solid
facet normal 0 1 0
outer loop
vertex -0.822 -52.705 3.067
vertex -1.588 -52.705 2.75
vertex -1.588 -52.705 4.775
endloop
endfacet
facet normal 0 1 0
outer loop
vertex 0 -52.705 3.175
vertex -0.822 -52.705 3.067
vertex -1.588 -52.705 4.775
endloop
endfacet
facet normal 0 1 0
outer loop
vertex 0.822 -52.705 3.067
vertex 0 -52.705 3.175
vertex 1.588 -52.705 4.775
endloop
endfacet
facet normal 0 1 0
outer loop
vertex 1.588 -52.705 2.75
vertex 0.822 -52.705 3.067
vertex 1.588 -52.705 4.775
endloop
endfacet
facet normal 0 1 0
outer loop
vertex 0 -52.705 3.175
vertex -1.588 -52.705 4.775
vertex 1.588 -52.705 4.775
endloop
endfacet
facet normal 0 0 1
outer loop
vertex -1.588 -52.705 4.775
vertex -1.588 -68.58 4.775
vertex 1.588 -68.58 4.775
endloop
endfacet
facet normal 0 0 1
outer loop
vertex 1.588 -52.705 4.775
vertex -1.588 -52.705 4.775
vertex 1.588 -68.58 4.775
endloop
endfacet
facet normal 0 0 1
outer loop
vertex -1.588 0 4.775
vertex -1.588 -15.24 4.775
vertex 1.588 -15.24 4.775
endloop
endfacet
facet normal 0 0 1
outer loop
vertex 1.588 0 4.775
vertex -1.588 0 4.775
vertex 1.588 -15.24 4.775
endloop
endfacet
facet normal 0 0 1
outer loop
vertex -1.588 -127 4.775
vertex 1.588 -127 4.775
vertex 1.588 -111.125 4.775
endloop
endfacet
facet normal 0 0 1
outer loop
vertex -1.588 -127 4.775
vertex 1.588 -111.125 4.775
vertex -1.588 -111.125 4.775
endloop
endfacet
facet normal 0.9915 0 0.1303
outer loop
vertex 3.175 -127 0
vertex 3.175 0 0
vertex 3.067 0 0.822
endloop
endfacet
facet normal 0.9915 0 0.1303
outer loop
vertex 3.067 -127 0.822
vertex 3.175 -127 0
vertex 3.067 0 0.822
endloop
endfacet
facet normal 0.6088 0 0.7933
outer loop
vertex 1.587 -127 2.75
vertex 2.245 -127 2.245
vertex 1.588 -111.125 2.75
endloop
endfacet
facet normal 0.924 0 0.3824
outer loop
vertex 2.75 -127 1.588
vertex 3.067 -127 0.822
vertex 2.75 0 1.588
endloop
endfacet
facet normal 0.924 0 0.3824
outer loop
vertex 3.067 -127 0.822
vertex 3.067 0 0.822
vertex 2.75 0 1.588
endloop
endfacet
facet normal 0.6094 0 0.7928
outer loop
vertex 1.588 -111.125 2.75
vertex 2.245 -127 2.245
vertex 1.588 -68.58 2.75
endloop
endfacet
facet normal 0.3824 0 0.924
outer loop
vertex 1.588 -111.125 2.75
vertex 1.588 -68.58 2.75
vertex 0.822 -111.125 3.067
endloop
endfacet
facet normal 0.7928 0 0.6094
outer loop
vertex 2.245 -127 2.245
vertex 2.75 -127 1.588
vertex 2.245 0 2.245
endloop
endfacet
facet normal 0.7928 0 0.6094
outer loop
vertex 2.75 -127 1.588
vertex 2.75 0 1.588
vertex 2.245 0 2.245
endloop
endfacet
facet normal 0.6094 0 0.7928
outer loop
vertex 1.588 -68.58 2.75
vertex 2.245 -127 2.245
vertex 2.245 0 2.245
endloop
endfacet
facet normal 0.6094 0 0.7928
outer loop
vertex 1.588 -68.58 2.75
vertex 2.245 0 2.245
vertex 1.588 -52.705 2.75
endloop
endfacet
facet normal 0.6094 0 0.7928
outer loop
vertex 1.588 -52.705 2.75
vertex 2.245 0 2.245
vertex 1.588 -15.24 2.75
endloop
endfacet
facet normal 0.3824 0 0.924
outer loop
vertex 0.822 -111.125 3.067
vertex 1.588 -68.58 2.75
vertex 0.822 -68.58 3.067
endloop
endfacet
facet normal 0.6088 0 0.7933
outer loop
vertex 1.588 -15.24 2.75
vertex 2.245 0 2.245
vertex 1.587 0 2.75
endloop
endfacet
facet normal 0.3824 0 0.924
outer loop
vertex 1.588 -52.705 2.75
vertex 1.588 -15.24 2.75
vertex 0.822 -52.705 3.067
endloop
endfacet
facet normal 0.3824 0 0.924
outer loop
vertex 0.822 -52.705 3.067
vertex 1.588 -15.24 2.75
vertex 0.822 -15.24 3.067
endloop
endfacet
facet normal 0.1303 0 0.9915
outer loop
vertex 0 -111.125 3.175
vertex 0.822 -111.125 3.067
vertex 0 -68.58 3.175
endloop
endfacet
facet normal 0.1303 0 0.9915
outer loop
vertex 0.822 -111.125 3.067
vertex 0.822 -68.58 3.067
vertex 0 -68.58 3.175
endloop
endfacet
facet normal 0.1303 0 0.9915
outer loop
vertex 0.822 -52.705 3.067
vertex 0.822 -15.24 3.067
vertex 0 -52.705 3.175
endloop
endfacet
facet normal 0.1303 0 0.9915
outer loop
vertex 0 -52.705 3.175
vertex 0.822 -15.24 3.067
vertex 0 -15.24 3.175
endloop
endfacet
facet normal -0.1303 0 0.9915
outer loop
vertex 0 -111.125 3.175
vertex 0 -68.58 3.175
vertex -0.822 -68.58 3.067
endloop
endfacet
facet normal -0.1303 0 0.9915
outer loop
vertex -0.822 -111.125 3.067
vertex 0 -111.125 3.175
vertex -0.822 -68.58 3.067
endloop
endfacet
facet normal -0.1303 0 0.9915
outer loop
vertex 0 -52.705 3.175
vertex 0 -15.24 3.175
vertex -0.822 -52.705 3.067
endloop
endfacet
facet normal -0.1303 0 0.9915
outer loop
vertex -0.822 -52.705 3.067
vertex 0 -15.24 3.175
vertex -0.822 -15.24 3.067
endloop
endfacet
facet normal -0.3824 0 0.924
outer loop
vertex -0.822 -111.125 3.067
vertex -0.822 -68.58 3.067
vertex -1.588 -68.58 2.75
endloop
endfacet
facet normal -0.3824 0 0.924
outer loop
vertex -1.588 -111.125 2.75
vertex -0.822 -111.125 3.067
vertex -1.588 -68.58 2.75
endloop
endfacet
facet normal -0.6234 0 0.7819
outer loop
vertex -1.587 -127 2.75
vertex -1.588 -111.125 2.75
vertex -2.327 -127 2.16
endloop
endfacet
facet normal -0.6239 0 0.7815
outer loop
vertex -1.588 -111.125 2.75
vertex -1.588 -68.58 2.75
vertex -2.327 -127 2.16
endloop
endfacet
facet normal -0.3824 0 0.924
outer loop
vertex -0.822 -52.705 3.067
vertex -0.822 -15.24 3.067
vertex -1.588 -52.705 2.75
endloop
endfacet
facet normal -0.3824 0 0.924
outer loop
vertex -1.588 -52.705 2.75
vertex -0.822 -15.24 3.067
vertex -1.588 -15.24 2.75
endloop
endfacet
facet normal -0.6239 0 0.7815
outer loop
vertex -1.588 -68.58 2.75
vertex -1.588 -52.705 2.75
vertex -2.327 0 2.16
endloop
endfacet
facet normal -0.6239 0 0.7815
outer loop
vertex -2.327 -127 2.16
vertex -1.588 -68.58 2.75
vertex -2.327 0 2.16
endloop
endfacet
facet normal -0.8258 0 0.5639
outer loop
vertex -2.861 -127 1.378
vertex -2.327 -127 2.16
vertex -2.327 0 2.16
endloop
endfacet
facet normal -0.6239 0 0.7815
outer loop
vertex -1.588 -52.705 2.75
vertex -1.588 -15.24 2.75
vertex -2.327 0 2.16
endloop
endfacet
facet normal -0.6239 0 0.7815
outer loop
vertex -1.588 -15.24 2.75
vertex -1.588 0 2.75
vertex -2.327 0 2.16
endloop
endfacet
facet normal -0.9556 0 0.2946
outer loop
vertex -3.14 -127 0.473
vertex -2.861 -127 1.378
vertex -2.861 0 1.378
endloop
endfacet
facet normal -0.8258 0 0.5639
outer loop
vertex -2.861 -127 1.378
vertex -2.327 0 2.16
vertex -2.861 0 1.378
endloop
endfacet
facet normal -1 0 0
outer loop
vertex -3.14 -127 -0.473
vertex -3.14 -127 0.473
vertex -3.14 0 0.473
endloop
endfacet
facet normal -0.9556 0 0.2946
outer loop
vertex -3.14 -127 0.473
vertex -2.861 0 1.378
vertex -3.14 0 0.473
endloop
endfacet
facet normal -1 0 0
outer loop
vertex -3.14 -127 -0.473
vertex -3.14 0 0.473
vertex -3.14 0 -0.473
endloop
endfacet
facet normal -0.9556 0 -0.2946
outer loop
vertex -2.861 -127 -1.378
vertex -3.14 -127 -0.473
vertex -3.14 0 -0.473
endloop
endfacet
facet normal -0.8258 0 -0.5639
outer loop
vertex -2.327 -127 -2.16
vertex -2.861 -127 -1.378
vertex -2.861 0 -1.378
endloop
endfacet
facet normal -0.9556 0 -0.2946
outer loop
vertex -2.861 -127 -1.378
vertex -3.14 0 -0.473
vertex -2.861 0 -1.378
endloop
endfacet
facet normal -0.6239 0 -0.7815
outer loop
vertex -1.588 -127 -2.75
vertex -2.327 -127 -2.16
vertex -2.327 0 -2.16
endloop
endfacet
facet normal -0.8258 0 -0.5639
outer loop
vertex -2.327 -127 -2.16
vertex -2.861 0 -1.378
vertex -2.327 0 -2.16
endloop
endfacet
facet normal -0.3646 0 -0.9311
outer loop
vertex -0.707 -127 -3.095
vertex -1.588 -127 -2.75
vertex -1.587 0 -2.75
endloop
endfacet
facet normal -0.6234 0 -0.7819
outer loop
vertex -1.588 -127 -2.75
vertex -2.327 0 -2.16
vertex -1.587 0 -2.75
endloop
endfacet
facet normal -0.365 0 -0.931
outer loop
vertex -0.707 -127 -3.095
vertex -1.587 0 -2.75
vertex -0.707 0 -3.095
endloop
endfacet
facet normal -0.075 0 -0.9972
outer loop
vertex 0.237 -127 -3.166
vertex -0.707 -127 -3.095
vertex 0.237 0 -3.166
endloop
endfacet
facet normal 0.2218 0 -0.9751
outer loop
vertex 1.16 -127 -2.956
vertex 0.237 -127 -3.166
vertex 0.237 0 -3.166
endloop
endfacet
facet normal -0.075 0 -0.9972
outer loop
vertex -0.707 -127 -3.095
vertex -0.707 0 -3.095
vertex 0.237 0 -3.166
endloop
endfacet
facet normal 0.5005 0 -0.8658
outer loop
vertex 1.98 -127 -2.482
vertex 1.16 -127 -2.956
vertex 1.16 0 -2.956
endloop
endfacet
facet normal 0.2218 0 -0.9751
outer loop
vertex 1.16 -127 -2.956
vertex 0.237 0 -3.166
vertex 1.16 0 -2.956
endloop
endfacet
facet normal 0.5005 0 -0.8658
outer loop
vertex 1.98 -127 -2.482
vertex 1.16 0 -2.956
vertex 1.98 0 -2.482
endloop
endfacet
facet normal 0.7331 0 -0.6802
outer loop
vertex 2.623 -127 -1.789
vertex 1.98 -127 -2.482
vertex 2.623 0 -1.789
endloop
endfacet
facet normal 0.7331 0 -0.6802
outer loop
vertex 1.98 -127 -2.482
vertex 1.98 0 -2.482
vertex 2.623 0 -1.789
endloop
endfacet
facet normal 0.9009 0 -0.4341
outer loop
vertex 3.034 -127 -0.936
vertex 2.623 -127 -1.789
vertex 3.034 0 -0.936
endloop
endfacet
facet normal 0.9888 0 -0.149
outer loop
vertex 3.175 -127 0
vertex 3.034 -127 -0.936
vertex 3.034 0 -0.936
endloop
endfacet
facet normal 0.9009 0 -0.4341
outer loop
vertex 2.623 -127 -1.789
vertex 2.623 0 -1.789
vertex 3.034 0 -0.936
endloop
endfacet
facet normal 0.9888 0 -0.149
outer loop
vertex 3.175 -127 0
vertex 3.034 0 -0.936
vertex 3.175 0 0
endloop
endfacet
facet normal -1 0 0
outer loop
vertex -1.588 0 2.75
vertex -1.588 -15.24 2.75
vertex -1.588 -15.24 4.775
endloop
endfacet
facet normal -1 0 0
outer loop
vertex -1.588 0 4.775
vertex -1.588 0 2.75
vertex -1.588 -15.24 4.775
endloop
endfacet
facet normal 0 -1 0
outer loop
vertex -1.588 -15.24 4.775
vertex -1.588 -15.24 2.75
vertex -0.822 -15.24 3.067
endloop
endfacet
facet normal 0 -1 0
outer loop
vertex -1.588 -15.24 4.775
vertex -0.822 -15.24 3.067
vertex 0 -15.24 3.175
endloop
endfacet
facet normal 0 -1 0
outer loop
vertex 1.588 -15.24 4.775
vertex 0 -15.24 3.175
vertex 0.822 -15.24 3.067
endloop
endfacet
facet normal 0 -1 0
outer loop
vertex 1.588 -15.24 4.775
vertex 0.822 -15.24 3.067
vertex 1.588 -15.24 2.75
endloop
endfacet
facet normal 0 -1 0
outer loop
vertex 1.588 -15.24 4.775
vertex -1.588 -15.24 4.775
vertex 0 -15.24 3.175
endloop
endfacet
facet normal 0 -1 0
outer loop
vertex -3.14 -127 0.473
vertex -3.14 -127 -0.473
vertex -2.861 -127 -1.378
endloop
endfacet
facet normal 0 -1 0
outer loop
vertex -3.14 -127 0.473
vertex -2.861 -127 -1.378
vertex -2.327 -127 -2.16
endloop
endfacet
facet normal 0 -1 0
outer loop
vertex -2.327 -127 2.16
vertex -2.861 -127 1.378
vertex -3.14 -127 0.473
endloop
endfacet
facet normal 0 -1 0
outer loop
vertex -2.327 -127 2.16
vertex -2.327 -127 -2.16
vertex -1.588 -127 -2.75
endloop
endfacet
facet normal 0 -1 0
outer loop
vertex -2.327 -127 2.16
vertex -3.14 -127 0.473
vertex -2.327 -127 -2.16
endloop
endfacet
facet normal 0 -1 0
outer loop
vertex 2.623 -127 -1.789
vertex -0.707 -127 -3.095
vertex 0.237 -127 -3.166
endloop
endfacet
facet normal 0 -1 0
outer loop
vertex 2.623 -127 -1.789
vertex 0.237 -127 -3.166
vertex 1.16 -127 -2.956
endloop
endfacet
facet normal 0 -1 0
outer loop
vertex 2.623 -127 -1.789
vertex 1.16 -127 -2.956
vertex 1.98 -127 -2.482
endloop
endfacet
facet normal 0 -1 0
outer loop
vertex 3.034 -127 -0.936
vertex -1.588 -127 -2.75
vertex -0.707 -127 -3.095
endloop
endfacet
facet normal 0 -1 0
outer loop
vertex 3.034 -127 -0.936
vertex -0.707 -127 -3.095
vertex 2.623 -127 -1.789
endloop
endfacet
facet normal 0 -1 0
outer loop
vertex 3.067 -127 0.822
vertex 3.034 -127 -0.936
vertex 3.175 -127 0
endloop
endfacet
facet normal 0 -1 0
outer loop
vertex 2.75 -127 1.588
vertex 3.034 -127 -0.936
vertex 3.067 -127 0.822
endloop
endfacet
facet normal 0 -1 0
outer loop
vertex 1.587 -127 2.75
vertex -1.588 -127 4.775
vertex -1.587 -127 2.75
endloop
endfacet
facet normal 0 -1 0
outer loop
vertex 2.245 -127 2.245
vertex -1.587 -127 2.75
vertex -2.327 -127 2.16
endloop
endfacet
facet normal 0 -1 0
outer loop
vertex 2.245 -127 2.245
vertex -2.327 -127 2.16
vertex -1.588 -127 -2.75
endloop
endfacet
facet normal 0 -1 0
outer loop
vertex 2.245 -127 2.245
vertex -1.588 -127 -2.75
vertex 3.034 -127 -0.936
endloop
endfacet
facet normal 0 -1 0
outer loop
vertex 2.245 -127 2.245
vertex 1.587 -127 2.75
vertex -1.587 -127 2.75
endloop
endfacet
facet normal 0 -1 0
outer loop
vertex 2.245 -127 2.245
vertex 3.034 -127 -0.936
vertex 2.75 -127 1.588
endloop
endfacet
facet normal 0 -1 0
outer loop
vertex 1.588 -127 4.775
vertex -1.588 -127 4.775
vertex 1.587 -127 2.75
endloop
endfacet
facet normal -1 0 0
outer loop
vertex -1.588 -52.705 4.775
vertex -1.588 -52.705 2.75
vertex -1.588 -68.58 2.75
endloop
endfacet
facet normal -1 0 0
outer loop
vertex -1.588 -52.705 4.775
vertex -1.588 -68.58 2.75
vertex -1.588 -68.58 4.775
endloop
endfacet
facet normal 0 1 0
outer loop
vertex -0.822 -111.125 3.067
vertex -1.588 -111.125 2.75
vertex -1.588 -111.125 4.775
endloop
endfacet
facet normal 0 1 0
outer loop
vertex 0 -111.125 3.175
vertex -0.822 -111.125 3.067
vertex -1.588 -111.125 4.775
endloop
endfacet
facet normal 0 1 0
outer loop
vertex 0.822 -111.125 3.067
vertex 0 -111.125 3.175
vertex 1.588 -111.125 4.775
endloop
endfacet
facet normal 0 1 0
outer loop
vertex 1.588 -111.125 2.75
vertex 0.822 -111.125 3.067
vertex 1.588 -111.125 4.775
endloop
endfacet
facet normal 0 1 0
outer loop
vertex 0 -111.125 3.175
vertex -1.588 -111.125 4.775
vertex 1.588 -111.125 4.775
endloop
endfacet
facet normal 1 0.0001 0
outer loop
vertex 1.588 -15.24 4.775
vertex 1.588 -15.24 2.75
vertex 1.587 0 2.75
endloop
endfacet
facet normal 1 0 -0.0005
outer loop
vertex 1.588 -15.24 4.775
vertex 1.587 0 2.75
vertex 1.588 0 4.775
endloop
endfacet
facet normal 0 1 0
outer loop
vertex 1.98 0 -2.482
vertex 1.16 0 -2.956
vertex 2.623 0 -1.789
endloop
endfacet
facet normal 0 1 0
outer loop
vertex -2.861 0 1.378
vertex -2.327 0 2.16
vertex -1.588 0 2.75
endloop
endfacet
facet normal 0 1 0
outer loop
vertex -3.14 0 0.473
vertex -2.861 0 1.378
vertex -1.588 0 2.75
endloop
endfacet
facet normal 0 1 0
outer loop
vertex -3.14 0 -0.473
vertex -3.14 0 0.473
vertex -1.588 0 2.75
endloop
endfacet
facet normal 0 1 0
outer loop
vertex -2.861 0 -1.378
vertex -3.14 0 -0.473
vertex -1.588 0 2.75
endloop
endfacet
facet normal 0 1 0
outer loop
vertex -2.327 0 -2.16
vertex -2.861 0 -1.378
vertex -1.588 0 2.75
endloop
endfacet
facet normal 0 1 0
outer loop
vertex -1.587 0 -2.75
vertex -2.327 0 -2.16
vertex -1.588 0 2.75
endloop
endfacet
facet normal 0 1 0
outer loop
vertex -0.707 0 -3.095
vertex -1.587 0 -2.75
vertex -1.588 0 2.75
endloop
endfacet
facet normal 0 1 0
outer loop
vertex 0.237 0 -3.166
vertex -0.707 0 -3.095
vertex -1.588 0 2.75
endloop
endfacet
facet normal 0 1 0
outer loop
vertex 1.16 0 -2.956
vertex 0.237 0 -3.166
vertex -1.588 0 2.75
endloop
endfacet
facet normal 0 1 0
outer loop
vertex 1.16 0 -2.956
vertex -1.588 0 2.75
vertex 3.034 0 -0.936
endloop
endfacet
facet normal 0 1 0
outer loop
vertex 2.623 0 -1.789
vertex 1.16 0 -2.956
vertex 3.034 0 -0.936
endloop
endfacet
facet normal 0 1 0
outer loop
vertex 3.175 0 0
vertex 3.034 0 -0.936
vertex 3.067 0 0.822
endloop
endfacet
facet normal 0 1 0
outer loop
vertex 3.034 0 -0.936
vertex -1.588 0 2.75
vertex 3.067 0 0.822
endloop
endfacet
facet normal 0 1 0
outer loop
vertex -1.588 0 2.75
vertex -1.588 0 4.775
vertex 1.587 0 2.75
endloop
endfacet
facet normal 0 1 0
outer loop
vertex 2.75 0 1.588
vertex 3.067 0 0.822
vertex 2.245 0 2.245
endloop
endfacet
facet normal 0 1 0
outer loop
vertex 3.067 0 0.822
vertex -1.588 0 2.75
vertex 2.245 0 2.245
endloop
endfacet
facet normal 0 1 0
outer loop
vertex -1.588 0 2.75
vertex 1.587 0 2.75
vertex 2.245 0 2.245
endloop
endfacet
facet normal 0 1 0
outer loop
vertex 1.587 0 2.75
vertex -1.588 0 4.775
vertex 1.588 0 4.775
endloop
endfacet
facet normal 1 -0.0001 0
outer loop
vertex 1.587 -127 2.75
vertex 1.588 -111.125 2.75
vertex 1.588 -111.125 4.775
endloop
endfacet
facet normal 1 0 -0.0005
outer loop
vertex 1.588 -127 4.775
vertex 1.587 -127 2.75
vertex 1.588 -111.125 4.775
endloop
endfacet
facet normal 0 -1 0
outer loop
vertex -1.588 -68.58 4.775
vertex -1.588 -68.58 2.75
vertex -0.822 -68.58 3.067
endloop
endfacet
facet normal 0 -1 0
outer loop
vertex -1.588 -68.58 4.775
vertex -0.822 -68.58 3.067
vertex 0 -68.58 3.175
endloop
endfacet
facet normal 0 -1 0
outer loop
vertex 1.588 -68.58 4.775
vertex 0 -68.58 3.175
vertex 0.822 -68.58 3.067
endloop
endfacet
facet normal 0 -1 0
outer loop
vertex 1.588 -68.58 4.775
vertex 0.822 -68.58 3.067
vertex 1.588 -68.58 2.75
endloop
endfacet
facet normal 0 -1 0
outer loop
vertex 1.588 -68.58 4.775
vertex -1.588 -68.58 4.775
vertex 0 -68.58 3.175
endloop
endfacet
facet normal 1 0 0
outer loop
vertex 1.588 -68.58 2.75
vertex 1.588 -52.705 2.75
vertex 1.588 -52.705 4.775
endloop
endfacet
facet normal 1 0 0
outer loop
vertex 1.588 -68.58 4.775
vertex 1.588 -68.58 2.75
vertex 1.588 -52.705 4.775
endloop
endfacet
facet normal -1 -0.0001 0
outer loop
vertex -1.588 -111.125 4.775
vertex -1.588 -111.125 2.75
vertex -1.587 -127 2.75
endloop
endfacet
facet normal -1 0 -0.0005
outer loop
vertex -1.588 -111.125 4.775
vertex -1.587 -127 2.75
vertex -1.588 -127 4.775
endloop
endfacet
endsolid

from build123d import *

# Parameters (mm, degrees)
F0_R     = 3.175
F1_DEPTH = 127
F2_W     = 1.5875
F2_H     = 3.175
F3_DEPTH = 15.875
F5_W     = 3.175
F5_H     = 3.175
F6_DEPTH = 15.875
F8_W     = 3.175
F8_H     = 3.1142037669
F9_DEPTH = 15.24


with BuildPart() as f1:
    # F0 (on Front) → F1 (new body)
    with BuildSketch(Plane.XZ):
        Circle(F0_R)
    extrude(amount=F1_DEPTH)

    # F2 (on face) → F3 (join)
    with BuildSketch(Plane.XZ.offset(127)):
        with Locations((-0.79375, 3.1877)):
            Rectangle(F2_W, F2_H)
        with Locations((0.79375, 3.1877)):
            Rectangle(F2_W, F2_H)
    extrude(amount=-F3_DEPTH)

    # F5 (on offset) → F6 (join)
    with BuildSketch(Plane.XZ.offset(68.58)):
        with Locations((0, 3.1877)):
            Rectangle(F5_W, F5_H)
    extrude(amount=-F6_DEPTH)

    # F8 (on offset) → F9 (join)
    with BuildSketch(Plane.XZ.offset(15.24)):
        with Locations((0, 3.2180981166)):
            Rectangle(F8_W, F8_H)
    extrude(amount=-F9_DEPTH)


solid = f1.part
